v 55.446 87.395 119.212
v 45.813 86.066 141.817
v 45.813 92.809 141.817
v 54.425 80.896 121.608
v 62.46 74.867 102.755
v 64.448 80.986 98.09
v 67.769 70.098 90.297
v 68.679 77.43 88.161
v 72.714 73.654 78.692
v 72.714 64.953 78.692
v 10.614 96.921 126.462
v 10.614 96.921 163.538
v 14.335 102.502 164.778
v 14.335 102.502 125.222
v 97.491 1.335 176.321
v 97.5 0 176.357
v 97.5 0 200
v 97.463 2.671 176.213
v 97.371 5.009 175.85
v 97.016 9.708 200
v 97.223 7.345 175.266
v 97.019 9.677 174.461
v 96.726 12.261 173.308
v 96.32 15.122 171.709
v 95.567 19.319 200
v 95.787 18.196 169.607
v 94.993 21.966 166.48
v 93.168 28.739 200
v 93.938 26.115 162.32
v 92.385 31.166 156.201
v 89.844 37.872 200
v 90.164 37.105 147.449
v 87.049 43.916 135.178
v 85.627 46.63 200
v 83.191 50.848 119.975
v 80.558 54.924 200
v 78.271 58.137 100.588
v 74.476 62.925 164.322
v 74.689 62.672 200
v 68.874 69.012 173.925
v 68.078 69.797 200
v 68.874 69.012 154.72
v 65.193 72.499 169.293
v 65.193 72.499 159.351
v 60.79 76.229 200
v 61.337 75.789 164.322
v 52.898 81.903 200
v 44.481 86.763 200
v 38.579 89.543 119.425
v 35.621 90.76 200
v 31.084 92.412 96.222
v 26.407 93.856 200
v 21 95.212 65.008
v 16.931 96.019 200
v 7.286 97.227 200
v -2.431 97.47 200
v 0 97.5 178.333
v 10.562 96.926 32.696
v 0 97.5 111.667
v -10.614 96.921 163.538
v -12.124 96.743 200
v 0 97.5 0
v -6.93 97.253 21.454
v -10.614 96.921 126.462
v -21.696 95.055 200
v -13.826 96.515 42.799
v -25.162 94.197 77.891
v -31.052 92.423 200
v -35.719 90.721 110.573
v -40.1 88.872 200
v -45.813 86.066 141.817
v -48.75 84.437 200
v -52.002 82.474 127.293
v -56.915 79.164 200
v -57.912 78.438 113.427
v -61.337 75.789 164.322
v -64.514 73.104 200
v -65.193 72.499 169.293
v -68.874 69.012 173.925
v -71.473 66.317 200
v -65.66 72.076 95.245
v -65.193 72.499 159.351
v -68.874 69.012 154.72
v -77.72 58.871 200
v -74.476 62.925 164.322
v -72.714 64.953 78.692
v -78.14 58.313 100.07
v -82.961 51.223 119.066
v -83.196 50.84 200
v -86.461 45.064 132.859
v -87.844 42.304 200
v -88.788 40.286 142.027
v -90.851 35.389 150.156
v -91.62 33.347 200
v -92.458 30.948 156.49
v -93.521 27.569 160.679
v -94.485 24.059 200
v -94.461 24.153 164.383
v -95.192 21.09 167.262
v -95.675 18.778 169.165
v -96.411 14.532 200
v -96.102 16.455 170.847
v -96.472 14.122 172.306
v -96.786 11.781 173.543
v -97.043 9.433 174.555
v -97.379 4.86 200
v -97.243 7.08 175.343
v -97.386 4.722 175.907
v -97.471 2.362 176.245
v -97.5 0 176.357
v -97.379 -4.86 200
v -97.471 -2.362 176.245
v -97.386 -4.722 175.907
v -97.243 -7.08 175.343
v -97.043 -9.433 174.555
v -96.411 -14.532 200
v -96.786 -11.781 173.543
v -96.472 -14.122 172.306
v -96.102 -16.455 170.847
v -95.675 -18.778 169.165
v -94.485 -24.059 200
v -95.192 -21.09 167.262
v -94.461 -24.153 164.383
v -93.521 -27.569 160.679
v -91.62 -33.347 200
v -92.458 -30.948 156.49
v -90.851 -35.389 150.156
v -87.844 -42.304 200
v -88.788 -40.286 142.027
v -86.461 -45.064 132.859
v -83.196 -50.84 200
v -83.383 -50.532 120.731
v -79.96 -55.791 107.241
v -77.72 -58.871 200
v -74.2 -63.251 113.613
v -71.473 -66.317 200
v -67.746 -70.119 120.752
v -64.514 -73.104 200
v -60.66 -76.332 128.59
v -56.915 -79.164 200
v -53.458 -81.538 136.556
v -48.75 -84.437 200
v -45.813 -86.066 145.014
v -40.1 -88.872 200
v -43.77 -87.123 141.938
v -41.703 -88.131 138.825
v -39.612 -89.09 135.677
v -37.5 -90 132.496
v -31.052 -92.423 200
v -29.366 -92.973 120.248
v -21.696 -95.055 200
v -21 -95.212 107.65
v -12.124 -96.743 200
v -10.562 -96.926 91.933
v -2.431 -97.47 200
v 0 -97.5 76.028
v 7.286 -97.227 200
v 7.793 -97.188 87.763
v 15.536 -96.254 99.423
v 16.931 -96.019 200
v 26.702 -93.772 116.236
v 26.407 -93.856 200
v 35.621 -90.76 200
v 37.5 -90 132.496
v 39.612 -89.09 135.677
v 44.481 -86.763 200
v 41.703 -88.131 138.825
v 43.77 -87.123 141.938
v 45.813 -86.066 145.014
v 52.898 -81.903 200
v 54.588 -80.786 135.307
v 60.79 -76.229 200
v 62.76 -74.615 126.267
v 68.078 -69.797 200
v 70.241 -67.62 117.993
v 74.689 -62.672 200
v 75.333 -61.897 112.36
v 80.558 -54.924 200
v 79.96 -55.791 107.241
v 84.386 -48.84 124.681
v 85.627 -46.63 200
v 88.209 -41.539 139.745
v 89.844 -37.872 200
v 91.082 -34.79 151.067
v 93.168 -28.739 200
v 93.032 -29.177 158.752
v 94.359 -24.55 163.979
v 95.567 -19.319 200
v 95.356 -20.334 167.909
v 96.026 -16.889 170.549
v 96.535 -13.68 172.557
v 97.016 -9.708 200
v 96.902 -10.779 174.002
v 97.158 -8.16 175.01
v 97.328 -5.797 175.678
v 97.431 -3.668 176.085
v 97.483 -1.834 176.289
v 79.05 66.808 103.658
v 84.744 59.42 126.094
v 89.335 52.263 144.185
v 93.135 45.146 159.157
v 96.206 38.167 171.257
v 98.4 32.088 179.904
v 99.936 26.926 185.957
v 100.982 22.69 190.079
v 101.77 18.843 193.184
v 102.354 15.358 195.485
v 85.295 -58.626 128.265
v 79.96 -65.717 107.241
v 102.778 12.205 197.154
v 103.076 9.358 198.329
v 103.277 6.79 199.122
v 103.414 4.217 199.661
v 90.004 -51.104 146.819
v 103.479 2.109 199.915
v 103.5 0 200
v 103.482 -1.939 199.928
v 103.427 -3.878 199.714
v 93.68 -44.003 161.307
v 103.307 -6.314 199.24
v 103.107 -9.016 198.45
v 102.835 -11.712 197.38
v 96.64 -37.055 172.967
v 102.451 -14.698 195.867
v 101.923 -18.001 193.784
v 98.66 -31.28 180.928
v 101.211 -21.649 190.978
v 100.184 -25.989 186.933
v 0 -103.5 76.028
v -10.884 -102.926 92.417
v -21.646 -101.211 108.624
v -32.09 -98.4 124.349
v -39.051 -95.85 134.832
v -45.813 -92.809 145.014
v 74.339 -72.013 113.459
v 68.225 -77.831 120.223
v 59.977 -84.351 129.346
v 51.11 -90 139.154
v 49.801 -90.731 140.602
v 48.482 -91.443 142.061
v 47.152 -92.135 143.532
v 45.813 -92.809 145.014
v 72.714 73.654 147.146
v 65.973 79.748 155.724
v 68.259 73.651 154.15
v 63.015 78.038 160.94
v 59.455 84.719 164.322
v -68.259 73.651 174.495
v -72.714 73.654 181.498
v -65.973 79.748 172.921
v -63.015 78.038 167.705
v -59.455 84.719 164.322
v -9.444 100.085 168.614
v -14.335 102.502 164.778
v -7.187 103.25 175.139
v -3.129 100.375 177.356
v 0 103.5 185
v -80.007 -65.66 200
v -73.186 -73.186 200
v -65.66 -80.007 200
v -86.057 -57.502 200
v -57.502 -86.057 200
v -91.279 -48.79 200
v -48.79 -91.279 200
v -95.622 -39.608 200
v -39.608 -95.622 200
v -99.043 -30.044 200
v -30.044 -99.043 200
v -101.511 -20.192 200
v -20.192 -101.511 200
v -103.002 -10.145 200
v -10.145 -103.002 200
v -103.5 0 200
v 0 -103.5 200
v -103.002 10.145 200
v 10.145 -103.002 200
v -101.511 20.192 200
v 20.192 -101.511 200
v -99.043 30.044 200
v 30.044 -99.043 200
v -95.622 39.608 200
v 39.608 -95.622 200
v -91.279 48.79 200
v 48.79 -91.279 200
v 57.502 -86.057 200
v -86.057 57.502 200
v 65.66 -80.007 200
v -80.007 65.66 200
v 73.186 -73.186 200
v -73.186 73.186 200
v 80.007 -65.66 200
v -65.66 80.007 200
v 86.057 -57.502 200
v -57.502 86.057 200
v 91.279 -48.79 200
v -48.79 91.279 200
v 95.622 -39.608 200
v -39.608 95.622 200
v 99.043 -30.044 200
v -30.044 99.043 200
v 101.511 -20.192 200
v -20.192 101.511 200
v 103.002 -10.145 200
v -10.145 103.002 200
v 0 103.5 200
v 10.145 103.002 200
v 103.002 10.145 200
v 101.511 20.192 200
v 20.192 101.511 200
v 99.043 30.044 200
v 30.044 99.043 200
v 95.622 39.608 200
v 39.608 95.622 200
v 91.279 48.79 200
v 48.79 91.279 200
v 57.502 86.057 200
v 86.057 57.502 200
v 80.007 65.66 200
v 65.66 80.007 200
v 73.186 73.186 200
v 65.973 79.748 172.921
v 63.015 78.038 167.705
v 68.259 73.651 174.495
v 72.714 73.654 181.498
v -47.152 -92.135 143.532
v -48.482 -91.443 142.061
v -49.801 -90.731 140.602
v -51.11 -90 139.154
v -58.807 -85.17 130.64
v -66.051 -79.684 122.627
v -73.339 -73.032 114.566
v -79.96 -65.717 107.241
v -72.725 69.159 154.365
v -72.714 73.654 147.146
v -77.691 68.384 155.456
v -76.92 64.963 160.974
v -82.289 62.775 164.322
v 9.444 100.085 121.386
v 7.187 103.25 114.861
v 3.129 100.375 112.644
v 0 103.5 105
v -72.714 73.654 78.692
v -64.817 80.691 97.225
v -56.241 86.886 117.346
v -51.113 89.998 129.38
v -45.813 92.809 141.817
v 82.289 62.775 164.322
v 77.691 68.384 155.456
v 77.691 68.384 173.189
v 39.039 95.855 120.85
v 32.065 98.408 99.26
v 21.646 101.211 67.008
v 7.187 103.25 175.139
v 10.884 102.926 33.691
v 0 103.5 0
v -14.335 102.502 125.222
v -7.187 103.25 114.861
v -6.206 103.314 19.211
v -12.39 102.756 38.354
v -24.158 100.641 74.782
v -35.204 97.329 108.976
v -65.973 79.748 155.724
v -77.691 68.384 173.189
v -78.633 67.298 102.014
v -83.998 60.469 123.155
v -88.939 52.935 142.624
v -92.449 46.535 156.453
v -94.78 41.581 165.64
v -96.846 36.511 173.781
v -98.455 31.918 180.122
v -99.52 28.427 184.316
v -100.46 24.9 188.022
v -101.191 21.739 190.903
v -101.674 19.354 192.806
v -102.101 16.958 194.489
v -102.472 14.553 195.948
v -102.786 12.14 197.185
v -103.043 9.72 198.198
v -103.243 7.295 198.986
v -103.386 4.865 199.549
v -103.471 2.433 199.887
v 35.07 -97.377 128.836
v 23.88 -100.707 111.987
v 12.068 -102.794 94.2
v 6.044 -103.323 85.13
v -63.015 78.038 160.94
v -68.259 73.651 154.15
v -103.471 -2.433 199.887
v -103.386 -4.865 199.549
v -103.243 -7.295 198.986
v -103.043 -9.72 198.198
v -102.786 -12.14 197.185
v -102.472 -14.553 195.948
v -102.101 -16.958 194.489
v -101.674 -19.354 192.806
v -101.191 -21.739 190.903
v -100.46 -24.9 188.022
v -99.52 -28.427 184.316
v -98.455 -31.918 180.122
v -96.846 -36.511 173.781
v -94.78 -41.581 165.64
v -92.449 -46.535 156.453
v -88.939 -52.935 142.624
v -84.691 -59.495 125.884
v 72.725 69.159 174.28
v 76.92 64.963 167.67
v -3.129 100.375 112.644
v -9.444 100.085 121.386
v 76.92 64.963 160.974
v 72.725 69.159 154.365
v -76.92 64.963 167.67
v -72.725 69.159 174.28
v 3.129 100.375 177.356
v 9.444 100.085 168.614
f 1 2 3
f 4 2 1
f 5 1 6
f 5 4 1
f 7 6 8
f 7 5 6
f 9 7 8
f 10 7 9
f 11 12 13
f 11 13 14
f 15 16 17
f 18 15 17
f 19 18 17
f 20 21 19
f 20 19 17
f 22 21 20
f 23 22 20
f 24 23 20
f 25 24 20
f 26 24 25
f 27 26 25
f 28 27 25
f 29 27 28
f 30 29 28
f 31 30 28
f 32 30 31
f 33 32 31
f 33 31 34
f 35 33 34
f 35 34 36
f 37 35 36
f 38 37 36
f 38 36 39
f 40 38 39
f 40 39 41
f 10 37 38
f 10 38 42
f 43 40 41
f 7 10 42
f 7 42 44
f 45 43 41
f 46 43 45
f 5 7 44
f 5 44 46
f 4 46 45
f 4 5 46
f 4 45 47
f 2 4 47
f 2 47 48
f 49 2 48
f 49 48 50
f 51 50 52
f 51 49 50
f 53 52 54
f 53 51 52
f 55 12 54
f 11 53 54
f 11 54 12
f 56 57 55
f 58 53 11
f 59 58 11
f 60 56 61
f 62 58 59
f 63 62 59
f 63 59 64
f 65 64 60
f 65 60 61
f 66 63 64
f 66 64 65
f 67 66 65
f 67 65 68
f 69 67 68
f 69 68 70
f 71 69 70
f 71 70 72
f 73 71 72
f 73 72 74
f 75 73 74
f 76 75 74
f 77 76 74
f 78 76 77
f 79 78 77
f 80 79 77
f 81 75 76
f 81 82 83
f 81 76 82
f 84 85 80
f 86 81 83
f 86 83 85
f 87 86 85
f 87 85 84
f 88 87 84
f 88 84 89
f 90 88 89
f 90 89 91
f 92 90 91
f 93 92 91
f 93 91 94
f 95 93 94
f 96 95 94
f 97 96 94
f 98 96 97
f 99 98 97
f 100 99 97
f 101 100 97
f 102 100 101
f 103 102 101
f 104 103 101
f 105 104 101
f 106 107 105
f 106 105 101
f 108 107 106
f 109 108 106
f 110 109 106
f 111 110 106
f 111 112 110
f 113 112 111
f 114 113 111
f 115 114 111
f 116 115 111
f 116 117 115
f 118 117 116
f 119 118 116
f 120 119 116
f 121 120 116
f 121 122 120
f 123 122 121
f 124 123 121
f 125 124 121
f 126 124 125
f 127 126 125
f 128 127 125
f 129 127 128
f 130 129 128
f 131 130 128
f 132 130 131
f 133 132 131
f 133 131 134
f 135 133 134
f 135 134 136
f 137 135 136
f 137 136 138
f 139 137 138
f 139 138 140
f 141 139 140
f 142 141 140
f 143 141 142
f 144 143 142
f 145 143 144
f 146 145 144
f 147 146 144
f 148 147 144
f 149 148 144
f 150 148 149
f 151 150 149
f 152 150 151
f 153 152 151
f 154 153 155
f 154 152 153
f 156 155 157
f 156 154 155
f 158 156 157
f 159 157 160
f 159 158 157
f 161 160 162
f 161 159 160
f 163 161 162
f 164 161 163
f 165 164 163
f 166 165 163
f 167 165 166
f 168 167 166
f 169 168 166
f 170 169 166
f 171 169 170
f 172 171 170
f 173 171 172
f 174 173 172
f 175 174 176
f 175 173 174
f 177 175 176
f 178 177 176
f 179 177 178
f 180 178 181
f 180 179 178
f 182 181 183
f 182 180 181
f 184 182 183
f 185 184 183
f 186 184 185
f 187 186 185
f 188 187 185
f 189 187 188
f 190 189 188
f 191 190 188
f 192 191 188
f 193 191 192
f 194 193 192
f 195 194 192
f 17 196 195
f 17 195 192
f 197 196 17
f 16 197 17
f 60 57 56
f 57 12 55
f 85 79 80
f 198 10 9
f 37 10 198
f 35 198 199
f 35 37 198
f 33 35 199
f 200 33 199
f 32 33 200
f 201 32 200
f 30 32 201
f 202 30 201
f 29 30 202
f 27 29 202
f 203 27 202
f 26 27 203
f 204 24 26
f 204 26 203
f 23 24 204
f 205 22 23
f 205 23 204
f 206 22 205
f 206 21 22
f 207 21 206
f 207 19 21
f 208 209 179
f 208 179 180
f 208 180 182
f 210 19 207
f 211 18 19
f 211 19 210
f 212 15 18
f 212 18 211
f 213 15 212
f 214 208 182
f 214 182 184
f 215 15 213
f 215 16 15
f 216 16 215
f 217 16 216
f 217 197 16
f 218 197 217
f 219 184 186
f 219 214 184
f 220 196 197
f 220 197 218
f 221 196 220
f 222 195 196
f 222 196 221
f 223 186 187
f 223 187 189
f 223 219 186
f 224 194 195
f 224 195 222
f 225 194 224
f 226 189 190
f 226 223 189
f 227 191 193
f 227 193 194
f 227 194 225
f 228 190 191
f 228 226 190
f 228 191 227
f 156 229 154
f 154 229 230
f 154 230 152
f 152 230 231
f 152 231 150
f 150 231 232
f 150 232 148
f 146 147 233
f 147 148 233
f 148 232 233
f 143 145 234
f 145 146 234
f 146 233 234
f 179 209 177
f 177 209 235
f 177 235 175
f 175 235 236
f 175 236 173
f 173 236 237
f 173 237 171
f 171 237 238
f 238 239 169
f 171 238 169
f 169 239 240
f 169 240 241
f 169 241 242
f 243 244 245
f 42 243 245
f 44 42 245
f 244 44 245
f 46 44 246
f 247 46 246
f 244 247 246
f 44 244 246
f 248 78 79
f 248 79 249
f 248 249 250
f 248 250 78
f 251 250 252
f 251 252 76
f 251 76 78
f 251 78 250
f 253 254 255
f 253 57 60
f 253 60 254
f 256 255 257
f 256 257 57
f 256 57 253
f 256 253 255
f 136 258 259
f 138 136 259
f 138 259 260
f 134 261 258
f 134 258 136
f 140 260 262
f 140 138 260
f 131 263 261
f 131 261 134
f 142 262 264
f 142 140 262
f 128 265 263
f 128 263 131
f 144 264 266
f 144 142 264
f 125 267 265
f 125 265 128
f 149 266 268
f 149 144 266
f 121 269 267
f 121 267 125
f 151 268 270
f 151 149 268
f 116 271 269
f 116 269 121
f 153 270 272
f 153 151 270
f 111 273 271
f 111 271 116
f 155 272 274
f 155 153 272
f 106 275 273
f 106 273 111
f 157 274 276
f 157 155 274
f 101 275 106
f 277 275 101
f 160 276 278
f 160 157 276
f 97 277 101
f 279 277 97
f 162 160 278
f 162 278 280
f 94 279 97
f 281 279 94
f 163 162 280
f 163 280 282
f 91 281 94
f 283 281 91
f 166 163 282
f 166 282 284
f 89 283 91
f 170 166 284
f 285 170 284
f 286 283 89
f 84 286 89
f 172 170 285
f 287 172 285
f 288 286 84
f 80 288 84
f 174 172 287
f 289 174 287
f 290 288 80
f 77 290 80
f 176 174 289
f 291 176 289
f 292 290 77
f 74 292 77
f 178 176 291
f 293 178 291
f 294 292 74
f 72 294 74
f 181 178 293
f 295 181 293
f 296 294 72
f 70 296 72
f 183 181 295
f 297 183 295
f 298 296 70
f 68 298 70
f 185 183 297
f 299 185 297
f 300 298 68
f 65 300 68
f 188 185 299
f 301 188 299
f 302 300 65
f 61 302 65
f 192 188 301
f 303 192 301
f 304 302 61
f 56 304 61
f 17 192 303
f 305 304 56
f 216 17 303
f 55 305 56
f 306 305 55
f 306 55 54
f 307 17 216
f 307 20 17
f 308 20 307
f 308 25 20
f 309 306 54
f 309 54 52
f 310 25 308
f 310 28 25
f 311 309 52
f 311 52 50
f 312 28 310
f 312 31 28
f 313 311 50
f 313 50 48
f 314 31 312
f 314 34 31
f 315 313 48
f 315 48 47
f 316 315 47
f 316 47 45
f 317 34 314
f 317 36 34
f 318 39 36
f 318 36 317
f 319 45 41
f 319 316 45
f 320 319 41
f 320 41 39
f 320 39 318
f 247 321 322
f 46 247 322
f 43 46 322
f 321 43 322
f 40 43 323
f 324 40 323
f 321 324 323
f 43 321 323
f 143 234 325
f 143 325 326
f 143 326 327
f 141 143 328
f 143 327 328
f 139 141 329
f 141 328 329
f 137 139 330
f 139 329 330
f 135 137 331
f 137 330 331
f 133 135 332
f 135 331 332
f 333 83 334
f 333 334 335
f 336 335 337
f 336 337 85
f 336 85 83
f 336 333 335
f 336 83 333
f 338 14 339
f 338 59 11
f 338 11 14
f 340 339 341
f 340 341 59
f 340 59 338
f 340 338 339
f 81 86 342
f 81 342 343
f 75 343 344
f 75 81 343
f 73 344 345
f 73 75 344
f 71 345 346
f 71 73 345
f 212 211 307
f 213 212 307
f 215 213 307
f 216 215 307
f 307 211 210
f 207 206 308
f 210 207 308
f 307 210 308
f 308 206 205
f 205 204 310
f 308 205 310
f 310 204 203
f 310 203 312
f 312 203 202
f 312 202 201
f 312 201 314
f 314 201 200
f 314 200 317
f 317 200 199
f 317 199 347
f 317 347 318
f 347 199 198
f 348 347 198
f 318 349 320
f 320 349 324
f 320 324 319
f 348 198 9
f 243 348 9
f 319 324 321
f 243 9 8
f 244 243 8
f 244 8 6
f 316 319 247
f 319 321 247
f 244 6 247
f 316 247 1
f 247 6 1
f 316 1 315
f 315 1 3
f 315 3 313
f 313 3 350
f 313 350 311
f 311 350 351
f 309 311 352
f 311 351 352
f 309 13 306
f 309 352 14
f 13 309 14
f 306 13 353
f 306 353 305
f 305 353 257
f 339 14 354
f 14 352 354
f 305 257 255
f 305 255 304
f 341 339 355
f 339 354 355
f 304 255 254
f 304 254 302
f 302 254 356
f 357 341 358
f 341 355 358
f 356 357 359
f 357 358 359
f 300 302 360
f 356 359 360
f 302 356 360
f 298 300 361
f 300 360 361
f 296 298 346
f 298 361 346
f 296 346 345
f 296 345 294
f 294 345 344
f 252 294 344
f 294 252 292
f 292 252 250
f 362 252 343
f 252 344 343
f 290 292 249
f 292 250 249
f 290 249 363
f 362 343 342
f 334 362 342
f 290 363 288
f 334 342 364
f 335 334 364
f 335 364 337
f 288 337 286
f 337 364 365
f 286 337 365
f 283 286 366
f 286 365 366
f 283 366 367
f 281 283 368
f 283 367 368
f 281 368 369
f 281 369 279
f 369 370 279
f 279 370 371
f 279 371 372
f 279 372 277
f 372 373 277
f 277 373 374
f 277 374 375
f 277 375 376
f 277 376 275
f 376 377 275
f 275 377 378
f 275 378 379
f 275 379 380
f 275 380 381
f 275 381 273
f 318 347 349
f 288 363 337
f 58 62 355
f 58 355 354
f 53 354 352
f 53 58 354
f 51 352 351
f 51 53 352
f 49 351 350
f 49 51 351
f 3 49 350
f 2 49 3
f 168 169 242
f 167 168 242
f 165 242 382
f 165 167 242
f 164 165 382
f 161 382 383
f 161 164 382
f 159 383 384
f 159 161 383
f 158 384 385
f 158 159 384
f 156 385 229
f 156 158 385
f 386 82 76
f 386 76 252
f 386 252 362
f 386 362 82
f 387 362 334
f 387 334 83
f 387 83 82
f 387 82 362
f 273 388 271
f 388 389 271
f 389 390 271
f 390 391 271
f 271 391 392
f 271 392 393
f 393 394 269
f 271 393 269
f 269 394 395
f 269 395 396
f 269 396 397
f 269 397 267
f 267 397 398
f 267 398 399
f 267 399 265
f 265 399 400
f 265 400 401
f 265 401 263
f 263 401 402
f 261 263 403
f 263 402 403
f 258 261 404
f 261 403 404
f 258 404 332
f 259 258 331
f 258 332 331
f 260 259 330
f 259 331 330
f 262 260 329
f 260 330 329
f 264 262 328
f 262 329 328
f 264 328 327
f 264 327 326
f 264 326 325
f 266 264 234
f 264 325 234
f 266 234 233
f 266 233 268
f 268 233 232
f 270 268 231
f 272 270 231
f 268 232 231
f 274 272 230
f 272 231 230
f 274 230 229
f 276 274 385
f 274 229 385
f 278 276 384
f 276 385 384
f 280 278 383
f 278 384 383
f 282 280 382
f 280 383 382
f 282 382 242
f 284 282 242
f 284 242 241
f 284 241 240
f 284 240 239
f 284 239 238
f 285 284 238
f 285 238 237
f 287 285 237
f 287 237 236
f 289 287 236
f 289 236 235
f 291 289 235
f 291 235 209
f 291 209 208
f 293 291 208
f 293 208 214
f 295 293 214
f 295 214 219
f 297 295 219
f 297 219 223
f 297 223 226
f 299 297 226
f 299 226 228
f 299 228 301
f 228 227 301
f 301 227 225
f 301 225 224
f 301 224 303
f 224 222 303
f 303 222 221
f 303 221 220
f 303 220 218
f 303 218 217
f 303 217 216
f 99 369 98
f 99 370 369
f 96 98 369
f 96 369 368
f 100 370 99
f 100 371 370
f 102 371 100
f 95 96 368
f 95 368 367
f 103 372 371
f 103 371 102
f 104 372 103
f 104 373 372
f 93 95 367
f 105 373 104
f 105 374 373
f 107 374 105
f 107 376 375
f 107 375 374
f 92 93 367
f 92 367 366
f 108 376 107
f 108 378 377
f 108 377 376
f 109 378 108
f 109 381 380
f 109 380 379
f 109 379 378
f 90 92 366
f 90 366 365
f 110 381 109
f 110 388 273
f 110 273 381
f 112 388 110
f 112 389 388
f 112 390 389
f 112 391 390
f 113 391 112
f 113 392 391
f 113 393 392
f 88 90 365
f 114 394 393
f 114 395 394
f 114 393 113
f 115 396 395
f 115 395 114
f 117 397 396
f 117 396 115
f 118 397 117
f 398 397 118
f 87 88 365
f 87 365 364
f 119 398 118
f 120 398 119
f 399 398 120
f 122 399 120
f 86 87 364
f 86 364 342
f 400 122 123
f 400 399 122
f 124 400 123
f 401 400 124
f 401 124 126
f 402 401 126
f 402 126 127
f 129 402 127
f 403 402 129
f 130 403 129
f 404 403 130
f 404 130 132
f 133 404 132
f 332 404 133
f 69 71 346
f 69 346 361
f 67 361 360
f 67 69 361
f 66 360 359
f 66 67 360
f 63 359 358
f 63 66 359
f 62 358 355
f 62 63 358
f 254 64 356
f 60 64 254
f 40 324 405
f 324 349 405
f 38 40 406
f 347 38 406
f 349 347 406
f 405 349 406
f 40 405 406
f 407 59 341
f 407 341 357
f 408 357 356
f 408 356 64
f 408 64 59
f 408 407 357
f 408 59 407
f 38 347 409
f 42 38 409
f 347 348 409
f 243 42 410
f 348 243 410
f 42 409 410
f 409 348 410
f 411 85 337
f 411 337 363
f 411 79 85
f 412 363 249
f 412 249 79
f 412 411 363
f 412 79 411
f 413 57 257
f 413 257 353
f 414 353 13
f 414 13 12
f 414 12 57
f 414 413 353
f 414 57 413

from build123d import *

# Parameters (mm, degrees)
CROQUIS1_R               = 103.5
CROQUIS1_R_2             = 97.5
BASE_DEPTH               = 200
DISE_O_DEPTH             = 150
DISE_O_DEPTH_BACK        = 150
PATR_NTRASERO_DEPTH      = 20
PATR_NTRASERO_DEPTH_BACK = 90


with BuildPart() as part:
    # Croquis1 → Base (new body)
    with BuildSketch(Plane.XY):
        Circle(CROQUIS1_R)
        Circle(CROQUIS1_R_2, mode=Mode.SUBTRACT)
    extrude(amount=BASE_DEPTH)

    # Croquis2 → Diseño (cut, two sides)
    with BuildSketch(Plane(origin=(0, 0, 0), x_dir=(1, 0, 0), z_dir=(0, 1, 0))) as dise_o_sk:
        Polygon((-103.5, 0), (-103.5, -200), (-72.714481971, -78.691726895), (-45.812787176, -141.817485969), (0, 0), align=None)
        Polygon((72.714481971, -78.691726895), (103.5, -200), (103.5, 0), (0, 0), (45.812787176, -141.817485969), align=None)
    extrude(amount=DISE_O_DEPTH, mode=Mode.SUBTRACT)
    extrude(dise_o_sk.sketch, amount=-DISE_O_DEPTH_BACK, mode=Mode.SUBTRACT)

    # Croquis12 → PatrónTrasero (cut, two sides)
    with BuildSketch(Plane(origin=(0, -90, 0), x_dir=(-1, 0, 0), z_dir=(0, -1, 0))) as patr_ntrasero_sk:
        Polygon((-103.5, 1.909548239), (-103.5, -200), (-79.959810945, -107.241460736), (-45.812787176, -145.013726935), (0, -76.028192757), (45.812787176, -145.013726935), (79.959810945, -107.241460736), (103.5, -200), (103.5, 1.909548239), align=None)
    extrude(amount=PATR_NTRASERO_DEPTH, mode=Mode.SUBTRACT)
    extrude(patr_ntrasero_sk.sketch, amount=-PATR_NTRASERO_DEPTH_BACK, mode=Mode.SUBTRACT)

    # Croquis14 → RanuraPrimalJewel section 0
    with BuildSketch(Plane(origin=(0, 103.5, 0), x_dir=(1, 0, 0), z_dir=(0, 1, 0))):
        Polygon((15, -165), (15, -125), (0, -105), (-15, -125), (-15, -165), (0, -185), align=None)
    # Croquis17 → RanuraPrimalJewel section 1
    with BuildSketch(Plane(origin=(0, 94.5, 0), x_dir=(1, 0, 0), z_dir=(0, 1, 0))):
        Polygon((-9, -127), (0, -115), (9, -127), (9, -163), (0, -175), (-9, -163), align=None)
    loft(mode=Mode.SUBTRACT)

    # Croquis20 → Cortar-Recubrir1 section 0
    with BuildSketch(Plane(origin=(-65.973382939, 79.748120627, 0), x_dir=(0, 0, 1), z_dir=(-0.63742399, 0.770513243, 0))):
        Polygon((146.644660941, -9.078894023), (164.32233047, -26.756563553), (182, -9.078894023), (164.32233047, 8.598775507), align=None)
    # Croquis22 → Cortar-Recubrir1 section 1
    with BuildSketch(Plane(origin=(-60.236567031, 72.813501442, 0), x_dir=(0, 0, 1), z_dir=(-0.63742399, 0.770513243, 0))):
        Polygon((157.95836944, -9.078894023), (164.32233047, -15.442855054), (170.686291501, -9.078894023), (164.32233047, -2.714932992), align=None)
    loft(mode=Mode.SUBTRACT)

    # Croquis30 → Cortar-Recubrir2 section 0
    with BuildSketch(Plane(origin=(60.236567031, 72.813501442, 0), x_dir=(0, 0, 1), z_dir=(0.63742399, 0.770513243, 0))):
        Polygon((157.95836944, 9.078894023), (164.32233047, 2.714932992), (170.686291501, 9.078894023), (164.32233047, 15.442855054), align=None)
    # Croquis29 → Cortar-Recubrir2 section 1
    with BuildSketch(Plane(origin=(65.973382939, 79.748120627, 0), x_dir=(0, 0, 1), z_dir=(0.63742399, 0.770513243, 0))):
        Polygon((182, 9.078894023), (164.32233047, 26.756563553), (146.644660941, 9.078894023), (164.32233047, -8.598775507), align=None)
    loft(mode=Mode.SUBTRACT)


solid = part.part
